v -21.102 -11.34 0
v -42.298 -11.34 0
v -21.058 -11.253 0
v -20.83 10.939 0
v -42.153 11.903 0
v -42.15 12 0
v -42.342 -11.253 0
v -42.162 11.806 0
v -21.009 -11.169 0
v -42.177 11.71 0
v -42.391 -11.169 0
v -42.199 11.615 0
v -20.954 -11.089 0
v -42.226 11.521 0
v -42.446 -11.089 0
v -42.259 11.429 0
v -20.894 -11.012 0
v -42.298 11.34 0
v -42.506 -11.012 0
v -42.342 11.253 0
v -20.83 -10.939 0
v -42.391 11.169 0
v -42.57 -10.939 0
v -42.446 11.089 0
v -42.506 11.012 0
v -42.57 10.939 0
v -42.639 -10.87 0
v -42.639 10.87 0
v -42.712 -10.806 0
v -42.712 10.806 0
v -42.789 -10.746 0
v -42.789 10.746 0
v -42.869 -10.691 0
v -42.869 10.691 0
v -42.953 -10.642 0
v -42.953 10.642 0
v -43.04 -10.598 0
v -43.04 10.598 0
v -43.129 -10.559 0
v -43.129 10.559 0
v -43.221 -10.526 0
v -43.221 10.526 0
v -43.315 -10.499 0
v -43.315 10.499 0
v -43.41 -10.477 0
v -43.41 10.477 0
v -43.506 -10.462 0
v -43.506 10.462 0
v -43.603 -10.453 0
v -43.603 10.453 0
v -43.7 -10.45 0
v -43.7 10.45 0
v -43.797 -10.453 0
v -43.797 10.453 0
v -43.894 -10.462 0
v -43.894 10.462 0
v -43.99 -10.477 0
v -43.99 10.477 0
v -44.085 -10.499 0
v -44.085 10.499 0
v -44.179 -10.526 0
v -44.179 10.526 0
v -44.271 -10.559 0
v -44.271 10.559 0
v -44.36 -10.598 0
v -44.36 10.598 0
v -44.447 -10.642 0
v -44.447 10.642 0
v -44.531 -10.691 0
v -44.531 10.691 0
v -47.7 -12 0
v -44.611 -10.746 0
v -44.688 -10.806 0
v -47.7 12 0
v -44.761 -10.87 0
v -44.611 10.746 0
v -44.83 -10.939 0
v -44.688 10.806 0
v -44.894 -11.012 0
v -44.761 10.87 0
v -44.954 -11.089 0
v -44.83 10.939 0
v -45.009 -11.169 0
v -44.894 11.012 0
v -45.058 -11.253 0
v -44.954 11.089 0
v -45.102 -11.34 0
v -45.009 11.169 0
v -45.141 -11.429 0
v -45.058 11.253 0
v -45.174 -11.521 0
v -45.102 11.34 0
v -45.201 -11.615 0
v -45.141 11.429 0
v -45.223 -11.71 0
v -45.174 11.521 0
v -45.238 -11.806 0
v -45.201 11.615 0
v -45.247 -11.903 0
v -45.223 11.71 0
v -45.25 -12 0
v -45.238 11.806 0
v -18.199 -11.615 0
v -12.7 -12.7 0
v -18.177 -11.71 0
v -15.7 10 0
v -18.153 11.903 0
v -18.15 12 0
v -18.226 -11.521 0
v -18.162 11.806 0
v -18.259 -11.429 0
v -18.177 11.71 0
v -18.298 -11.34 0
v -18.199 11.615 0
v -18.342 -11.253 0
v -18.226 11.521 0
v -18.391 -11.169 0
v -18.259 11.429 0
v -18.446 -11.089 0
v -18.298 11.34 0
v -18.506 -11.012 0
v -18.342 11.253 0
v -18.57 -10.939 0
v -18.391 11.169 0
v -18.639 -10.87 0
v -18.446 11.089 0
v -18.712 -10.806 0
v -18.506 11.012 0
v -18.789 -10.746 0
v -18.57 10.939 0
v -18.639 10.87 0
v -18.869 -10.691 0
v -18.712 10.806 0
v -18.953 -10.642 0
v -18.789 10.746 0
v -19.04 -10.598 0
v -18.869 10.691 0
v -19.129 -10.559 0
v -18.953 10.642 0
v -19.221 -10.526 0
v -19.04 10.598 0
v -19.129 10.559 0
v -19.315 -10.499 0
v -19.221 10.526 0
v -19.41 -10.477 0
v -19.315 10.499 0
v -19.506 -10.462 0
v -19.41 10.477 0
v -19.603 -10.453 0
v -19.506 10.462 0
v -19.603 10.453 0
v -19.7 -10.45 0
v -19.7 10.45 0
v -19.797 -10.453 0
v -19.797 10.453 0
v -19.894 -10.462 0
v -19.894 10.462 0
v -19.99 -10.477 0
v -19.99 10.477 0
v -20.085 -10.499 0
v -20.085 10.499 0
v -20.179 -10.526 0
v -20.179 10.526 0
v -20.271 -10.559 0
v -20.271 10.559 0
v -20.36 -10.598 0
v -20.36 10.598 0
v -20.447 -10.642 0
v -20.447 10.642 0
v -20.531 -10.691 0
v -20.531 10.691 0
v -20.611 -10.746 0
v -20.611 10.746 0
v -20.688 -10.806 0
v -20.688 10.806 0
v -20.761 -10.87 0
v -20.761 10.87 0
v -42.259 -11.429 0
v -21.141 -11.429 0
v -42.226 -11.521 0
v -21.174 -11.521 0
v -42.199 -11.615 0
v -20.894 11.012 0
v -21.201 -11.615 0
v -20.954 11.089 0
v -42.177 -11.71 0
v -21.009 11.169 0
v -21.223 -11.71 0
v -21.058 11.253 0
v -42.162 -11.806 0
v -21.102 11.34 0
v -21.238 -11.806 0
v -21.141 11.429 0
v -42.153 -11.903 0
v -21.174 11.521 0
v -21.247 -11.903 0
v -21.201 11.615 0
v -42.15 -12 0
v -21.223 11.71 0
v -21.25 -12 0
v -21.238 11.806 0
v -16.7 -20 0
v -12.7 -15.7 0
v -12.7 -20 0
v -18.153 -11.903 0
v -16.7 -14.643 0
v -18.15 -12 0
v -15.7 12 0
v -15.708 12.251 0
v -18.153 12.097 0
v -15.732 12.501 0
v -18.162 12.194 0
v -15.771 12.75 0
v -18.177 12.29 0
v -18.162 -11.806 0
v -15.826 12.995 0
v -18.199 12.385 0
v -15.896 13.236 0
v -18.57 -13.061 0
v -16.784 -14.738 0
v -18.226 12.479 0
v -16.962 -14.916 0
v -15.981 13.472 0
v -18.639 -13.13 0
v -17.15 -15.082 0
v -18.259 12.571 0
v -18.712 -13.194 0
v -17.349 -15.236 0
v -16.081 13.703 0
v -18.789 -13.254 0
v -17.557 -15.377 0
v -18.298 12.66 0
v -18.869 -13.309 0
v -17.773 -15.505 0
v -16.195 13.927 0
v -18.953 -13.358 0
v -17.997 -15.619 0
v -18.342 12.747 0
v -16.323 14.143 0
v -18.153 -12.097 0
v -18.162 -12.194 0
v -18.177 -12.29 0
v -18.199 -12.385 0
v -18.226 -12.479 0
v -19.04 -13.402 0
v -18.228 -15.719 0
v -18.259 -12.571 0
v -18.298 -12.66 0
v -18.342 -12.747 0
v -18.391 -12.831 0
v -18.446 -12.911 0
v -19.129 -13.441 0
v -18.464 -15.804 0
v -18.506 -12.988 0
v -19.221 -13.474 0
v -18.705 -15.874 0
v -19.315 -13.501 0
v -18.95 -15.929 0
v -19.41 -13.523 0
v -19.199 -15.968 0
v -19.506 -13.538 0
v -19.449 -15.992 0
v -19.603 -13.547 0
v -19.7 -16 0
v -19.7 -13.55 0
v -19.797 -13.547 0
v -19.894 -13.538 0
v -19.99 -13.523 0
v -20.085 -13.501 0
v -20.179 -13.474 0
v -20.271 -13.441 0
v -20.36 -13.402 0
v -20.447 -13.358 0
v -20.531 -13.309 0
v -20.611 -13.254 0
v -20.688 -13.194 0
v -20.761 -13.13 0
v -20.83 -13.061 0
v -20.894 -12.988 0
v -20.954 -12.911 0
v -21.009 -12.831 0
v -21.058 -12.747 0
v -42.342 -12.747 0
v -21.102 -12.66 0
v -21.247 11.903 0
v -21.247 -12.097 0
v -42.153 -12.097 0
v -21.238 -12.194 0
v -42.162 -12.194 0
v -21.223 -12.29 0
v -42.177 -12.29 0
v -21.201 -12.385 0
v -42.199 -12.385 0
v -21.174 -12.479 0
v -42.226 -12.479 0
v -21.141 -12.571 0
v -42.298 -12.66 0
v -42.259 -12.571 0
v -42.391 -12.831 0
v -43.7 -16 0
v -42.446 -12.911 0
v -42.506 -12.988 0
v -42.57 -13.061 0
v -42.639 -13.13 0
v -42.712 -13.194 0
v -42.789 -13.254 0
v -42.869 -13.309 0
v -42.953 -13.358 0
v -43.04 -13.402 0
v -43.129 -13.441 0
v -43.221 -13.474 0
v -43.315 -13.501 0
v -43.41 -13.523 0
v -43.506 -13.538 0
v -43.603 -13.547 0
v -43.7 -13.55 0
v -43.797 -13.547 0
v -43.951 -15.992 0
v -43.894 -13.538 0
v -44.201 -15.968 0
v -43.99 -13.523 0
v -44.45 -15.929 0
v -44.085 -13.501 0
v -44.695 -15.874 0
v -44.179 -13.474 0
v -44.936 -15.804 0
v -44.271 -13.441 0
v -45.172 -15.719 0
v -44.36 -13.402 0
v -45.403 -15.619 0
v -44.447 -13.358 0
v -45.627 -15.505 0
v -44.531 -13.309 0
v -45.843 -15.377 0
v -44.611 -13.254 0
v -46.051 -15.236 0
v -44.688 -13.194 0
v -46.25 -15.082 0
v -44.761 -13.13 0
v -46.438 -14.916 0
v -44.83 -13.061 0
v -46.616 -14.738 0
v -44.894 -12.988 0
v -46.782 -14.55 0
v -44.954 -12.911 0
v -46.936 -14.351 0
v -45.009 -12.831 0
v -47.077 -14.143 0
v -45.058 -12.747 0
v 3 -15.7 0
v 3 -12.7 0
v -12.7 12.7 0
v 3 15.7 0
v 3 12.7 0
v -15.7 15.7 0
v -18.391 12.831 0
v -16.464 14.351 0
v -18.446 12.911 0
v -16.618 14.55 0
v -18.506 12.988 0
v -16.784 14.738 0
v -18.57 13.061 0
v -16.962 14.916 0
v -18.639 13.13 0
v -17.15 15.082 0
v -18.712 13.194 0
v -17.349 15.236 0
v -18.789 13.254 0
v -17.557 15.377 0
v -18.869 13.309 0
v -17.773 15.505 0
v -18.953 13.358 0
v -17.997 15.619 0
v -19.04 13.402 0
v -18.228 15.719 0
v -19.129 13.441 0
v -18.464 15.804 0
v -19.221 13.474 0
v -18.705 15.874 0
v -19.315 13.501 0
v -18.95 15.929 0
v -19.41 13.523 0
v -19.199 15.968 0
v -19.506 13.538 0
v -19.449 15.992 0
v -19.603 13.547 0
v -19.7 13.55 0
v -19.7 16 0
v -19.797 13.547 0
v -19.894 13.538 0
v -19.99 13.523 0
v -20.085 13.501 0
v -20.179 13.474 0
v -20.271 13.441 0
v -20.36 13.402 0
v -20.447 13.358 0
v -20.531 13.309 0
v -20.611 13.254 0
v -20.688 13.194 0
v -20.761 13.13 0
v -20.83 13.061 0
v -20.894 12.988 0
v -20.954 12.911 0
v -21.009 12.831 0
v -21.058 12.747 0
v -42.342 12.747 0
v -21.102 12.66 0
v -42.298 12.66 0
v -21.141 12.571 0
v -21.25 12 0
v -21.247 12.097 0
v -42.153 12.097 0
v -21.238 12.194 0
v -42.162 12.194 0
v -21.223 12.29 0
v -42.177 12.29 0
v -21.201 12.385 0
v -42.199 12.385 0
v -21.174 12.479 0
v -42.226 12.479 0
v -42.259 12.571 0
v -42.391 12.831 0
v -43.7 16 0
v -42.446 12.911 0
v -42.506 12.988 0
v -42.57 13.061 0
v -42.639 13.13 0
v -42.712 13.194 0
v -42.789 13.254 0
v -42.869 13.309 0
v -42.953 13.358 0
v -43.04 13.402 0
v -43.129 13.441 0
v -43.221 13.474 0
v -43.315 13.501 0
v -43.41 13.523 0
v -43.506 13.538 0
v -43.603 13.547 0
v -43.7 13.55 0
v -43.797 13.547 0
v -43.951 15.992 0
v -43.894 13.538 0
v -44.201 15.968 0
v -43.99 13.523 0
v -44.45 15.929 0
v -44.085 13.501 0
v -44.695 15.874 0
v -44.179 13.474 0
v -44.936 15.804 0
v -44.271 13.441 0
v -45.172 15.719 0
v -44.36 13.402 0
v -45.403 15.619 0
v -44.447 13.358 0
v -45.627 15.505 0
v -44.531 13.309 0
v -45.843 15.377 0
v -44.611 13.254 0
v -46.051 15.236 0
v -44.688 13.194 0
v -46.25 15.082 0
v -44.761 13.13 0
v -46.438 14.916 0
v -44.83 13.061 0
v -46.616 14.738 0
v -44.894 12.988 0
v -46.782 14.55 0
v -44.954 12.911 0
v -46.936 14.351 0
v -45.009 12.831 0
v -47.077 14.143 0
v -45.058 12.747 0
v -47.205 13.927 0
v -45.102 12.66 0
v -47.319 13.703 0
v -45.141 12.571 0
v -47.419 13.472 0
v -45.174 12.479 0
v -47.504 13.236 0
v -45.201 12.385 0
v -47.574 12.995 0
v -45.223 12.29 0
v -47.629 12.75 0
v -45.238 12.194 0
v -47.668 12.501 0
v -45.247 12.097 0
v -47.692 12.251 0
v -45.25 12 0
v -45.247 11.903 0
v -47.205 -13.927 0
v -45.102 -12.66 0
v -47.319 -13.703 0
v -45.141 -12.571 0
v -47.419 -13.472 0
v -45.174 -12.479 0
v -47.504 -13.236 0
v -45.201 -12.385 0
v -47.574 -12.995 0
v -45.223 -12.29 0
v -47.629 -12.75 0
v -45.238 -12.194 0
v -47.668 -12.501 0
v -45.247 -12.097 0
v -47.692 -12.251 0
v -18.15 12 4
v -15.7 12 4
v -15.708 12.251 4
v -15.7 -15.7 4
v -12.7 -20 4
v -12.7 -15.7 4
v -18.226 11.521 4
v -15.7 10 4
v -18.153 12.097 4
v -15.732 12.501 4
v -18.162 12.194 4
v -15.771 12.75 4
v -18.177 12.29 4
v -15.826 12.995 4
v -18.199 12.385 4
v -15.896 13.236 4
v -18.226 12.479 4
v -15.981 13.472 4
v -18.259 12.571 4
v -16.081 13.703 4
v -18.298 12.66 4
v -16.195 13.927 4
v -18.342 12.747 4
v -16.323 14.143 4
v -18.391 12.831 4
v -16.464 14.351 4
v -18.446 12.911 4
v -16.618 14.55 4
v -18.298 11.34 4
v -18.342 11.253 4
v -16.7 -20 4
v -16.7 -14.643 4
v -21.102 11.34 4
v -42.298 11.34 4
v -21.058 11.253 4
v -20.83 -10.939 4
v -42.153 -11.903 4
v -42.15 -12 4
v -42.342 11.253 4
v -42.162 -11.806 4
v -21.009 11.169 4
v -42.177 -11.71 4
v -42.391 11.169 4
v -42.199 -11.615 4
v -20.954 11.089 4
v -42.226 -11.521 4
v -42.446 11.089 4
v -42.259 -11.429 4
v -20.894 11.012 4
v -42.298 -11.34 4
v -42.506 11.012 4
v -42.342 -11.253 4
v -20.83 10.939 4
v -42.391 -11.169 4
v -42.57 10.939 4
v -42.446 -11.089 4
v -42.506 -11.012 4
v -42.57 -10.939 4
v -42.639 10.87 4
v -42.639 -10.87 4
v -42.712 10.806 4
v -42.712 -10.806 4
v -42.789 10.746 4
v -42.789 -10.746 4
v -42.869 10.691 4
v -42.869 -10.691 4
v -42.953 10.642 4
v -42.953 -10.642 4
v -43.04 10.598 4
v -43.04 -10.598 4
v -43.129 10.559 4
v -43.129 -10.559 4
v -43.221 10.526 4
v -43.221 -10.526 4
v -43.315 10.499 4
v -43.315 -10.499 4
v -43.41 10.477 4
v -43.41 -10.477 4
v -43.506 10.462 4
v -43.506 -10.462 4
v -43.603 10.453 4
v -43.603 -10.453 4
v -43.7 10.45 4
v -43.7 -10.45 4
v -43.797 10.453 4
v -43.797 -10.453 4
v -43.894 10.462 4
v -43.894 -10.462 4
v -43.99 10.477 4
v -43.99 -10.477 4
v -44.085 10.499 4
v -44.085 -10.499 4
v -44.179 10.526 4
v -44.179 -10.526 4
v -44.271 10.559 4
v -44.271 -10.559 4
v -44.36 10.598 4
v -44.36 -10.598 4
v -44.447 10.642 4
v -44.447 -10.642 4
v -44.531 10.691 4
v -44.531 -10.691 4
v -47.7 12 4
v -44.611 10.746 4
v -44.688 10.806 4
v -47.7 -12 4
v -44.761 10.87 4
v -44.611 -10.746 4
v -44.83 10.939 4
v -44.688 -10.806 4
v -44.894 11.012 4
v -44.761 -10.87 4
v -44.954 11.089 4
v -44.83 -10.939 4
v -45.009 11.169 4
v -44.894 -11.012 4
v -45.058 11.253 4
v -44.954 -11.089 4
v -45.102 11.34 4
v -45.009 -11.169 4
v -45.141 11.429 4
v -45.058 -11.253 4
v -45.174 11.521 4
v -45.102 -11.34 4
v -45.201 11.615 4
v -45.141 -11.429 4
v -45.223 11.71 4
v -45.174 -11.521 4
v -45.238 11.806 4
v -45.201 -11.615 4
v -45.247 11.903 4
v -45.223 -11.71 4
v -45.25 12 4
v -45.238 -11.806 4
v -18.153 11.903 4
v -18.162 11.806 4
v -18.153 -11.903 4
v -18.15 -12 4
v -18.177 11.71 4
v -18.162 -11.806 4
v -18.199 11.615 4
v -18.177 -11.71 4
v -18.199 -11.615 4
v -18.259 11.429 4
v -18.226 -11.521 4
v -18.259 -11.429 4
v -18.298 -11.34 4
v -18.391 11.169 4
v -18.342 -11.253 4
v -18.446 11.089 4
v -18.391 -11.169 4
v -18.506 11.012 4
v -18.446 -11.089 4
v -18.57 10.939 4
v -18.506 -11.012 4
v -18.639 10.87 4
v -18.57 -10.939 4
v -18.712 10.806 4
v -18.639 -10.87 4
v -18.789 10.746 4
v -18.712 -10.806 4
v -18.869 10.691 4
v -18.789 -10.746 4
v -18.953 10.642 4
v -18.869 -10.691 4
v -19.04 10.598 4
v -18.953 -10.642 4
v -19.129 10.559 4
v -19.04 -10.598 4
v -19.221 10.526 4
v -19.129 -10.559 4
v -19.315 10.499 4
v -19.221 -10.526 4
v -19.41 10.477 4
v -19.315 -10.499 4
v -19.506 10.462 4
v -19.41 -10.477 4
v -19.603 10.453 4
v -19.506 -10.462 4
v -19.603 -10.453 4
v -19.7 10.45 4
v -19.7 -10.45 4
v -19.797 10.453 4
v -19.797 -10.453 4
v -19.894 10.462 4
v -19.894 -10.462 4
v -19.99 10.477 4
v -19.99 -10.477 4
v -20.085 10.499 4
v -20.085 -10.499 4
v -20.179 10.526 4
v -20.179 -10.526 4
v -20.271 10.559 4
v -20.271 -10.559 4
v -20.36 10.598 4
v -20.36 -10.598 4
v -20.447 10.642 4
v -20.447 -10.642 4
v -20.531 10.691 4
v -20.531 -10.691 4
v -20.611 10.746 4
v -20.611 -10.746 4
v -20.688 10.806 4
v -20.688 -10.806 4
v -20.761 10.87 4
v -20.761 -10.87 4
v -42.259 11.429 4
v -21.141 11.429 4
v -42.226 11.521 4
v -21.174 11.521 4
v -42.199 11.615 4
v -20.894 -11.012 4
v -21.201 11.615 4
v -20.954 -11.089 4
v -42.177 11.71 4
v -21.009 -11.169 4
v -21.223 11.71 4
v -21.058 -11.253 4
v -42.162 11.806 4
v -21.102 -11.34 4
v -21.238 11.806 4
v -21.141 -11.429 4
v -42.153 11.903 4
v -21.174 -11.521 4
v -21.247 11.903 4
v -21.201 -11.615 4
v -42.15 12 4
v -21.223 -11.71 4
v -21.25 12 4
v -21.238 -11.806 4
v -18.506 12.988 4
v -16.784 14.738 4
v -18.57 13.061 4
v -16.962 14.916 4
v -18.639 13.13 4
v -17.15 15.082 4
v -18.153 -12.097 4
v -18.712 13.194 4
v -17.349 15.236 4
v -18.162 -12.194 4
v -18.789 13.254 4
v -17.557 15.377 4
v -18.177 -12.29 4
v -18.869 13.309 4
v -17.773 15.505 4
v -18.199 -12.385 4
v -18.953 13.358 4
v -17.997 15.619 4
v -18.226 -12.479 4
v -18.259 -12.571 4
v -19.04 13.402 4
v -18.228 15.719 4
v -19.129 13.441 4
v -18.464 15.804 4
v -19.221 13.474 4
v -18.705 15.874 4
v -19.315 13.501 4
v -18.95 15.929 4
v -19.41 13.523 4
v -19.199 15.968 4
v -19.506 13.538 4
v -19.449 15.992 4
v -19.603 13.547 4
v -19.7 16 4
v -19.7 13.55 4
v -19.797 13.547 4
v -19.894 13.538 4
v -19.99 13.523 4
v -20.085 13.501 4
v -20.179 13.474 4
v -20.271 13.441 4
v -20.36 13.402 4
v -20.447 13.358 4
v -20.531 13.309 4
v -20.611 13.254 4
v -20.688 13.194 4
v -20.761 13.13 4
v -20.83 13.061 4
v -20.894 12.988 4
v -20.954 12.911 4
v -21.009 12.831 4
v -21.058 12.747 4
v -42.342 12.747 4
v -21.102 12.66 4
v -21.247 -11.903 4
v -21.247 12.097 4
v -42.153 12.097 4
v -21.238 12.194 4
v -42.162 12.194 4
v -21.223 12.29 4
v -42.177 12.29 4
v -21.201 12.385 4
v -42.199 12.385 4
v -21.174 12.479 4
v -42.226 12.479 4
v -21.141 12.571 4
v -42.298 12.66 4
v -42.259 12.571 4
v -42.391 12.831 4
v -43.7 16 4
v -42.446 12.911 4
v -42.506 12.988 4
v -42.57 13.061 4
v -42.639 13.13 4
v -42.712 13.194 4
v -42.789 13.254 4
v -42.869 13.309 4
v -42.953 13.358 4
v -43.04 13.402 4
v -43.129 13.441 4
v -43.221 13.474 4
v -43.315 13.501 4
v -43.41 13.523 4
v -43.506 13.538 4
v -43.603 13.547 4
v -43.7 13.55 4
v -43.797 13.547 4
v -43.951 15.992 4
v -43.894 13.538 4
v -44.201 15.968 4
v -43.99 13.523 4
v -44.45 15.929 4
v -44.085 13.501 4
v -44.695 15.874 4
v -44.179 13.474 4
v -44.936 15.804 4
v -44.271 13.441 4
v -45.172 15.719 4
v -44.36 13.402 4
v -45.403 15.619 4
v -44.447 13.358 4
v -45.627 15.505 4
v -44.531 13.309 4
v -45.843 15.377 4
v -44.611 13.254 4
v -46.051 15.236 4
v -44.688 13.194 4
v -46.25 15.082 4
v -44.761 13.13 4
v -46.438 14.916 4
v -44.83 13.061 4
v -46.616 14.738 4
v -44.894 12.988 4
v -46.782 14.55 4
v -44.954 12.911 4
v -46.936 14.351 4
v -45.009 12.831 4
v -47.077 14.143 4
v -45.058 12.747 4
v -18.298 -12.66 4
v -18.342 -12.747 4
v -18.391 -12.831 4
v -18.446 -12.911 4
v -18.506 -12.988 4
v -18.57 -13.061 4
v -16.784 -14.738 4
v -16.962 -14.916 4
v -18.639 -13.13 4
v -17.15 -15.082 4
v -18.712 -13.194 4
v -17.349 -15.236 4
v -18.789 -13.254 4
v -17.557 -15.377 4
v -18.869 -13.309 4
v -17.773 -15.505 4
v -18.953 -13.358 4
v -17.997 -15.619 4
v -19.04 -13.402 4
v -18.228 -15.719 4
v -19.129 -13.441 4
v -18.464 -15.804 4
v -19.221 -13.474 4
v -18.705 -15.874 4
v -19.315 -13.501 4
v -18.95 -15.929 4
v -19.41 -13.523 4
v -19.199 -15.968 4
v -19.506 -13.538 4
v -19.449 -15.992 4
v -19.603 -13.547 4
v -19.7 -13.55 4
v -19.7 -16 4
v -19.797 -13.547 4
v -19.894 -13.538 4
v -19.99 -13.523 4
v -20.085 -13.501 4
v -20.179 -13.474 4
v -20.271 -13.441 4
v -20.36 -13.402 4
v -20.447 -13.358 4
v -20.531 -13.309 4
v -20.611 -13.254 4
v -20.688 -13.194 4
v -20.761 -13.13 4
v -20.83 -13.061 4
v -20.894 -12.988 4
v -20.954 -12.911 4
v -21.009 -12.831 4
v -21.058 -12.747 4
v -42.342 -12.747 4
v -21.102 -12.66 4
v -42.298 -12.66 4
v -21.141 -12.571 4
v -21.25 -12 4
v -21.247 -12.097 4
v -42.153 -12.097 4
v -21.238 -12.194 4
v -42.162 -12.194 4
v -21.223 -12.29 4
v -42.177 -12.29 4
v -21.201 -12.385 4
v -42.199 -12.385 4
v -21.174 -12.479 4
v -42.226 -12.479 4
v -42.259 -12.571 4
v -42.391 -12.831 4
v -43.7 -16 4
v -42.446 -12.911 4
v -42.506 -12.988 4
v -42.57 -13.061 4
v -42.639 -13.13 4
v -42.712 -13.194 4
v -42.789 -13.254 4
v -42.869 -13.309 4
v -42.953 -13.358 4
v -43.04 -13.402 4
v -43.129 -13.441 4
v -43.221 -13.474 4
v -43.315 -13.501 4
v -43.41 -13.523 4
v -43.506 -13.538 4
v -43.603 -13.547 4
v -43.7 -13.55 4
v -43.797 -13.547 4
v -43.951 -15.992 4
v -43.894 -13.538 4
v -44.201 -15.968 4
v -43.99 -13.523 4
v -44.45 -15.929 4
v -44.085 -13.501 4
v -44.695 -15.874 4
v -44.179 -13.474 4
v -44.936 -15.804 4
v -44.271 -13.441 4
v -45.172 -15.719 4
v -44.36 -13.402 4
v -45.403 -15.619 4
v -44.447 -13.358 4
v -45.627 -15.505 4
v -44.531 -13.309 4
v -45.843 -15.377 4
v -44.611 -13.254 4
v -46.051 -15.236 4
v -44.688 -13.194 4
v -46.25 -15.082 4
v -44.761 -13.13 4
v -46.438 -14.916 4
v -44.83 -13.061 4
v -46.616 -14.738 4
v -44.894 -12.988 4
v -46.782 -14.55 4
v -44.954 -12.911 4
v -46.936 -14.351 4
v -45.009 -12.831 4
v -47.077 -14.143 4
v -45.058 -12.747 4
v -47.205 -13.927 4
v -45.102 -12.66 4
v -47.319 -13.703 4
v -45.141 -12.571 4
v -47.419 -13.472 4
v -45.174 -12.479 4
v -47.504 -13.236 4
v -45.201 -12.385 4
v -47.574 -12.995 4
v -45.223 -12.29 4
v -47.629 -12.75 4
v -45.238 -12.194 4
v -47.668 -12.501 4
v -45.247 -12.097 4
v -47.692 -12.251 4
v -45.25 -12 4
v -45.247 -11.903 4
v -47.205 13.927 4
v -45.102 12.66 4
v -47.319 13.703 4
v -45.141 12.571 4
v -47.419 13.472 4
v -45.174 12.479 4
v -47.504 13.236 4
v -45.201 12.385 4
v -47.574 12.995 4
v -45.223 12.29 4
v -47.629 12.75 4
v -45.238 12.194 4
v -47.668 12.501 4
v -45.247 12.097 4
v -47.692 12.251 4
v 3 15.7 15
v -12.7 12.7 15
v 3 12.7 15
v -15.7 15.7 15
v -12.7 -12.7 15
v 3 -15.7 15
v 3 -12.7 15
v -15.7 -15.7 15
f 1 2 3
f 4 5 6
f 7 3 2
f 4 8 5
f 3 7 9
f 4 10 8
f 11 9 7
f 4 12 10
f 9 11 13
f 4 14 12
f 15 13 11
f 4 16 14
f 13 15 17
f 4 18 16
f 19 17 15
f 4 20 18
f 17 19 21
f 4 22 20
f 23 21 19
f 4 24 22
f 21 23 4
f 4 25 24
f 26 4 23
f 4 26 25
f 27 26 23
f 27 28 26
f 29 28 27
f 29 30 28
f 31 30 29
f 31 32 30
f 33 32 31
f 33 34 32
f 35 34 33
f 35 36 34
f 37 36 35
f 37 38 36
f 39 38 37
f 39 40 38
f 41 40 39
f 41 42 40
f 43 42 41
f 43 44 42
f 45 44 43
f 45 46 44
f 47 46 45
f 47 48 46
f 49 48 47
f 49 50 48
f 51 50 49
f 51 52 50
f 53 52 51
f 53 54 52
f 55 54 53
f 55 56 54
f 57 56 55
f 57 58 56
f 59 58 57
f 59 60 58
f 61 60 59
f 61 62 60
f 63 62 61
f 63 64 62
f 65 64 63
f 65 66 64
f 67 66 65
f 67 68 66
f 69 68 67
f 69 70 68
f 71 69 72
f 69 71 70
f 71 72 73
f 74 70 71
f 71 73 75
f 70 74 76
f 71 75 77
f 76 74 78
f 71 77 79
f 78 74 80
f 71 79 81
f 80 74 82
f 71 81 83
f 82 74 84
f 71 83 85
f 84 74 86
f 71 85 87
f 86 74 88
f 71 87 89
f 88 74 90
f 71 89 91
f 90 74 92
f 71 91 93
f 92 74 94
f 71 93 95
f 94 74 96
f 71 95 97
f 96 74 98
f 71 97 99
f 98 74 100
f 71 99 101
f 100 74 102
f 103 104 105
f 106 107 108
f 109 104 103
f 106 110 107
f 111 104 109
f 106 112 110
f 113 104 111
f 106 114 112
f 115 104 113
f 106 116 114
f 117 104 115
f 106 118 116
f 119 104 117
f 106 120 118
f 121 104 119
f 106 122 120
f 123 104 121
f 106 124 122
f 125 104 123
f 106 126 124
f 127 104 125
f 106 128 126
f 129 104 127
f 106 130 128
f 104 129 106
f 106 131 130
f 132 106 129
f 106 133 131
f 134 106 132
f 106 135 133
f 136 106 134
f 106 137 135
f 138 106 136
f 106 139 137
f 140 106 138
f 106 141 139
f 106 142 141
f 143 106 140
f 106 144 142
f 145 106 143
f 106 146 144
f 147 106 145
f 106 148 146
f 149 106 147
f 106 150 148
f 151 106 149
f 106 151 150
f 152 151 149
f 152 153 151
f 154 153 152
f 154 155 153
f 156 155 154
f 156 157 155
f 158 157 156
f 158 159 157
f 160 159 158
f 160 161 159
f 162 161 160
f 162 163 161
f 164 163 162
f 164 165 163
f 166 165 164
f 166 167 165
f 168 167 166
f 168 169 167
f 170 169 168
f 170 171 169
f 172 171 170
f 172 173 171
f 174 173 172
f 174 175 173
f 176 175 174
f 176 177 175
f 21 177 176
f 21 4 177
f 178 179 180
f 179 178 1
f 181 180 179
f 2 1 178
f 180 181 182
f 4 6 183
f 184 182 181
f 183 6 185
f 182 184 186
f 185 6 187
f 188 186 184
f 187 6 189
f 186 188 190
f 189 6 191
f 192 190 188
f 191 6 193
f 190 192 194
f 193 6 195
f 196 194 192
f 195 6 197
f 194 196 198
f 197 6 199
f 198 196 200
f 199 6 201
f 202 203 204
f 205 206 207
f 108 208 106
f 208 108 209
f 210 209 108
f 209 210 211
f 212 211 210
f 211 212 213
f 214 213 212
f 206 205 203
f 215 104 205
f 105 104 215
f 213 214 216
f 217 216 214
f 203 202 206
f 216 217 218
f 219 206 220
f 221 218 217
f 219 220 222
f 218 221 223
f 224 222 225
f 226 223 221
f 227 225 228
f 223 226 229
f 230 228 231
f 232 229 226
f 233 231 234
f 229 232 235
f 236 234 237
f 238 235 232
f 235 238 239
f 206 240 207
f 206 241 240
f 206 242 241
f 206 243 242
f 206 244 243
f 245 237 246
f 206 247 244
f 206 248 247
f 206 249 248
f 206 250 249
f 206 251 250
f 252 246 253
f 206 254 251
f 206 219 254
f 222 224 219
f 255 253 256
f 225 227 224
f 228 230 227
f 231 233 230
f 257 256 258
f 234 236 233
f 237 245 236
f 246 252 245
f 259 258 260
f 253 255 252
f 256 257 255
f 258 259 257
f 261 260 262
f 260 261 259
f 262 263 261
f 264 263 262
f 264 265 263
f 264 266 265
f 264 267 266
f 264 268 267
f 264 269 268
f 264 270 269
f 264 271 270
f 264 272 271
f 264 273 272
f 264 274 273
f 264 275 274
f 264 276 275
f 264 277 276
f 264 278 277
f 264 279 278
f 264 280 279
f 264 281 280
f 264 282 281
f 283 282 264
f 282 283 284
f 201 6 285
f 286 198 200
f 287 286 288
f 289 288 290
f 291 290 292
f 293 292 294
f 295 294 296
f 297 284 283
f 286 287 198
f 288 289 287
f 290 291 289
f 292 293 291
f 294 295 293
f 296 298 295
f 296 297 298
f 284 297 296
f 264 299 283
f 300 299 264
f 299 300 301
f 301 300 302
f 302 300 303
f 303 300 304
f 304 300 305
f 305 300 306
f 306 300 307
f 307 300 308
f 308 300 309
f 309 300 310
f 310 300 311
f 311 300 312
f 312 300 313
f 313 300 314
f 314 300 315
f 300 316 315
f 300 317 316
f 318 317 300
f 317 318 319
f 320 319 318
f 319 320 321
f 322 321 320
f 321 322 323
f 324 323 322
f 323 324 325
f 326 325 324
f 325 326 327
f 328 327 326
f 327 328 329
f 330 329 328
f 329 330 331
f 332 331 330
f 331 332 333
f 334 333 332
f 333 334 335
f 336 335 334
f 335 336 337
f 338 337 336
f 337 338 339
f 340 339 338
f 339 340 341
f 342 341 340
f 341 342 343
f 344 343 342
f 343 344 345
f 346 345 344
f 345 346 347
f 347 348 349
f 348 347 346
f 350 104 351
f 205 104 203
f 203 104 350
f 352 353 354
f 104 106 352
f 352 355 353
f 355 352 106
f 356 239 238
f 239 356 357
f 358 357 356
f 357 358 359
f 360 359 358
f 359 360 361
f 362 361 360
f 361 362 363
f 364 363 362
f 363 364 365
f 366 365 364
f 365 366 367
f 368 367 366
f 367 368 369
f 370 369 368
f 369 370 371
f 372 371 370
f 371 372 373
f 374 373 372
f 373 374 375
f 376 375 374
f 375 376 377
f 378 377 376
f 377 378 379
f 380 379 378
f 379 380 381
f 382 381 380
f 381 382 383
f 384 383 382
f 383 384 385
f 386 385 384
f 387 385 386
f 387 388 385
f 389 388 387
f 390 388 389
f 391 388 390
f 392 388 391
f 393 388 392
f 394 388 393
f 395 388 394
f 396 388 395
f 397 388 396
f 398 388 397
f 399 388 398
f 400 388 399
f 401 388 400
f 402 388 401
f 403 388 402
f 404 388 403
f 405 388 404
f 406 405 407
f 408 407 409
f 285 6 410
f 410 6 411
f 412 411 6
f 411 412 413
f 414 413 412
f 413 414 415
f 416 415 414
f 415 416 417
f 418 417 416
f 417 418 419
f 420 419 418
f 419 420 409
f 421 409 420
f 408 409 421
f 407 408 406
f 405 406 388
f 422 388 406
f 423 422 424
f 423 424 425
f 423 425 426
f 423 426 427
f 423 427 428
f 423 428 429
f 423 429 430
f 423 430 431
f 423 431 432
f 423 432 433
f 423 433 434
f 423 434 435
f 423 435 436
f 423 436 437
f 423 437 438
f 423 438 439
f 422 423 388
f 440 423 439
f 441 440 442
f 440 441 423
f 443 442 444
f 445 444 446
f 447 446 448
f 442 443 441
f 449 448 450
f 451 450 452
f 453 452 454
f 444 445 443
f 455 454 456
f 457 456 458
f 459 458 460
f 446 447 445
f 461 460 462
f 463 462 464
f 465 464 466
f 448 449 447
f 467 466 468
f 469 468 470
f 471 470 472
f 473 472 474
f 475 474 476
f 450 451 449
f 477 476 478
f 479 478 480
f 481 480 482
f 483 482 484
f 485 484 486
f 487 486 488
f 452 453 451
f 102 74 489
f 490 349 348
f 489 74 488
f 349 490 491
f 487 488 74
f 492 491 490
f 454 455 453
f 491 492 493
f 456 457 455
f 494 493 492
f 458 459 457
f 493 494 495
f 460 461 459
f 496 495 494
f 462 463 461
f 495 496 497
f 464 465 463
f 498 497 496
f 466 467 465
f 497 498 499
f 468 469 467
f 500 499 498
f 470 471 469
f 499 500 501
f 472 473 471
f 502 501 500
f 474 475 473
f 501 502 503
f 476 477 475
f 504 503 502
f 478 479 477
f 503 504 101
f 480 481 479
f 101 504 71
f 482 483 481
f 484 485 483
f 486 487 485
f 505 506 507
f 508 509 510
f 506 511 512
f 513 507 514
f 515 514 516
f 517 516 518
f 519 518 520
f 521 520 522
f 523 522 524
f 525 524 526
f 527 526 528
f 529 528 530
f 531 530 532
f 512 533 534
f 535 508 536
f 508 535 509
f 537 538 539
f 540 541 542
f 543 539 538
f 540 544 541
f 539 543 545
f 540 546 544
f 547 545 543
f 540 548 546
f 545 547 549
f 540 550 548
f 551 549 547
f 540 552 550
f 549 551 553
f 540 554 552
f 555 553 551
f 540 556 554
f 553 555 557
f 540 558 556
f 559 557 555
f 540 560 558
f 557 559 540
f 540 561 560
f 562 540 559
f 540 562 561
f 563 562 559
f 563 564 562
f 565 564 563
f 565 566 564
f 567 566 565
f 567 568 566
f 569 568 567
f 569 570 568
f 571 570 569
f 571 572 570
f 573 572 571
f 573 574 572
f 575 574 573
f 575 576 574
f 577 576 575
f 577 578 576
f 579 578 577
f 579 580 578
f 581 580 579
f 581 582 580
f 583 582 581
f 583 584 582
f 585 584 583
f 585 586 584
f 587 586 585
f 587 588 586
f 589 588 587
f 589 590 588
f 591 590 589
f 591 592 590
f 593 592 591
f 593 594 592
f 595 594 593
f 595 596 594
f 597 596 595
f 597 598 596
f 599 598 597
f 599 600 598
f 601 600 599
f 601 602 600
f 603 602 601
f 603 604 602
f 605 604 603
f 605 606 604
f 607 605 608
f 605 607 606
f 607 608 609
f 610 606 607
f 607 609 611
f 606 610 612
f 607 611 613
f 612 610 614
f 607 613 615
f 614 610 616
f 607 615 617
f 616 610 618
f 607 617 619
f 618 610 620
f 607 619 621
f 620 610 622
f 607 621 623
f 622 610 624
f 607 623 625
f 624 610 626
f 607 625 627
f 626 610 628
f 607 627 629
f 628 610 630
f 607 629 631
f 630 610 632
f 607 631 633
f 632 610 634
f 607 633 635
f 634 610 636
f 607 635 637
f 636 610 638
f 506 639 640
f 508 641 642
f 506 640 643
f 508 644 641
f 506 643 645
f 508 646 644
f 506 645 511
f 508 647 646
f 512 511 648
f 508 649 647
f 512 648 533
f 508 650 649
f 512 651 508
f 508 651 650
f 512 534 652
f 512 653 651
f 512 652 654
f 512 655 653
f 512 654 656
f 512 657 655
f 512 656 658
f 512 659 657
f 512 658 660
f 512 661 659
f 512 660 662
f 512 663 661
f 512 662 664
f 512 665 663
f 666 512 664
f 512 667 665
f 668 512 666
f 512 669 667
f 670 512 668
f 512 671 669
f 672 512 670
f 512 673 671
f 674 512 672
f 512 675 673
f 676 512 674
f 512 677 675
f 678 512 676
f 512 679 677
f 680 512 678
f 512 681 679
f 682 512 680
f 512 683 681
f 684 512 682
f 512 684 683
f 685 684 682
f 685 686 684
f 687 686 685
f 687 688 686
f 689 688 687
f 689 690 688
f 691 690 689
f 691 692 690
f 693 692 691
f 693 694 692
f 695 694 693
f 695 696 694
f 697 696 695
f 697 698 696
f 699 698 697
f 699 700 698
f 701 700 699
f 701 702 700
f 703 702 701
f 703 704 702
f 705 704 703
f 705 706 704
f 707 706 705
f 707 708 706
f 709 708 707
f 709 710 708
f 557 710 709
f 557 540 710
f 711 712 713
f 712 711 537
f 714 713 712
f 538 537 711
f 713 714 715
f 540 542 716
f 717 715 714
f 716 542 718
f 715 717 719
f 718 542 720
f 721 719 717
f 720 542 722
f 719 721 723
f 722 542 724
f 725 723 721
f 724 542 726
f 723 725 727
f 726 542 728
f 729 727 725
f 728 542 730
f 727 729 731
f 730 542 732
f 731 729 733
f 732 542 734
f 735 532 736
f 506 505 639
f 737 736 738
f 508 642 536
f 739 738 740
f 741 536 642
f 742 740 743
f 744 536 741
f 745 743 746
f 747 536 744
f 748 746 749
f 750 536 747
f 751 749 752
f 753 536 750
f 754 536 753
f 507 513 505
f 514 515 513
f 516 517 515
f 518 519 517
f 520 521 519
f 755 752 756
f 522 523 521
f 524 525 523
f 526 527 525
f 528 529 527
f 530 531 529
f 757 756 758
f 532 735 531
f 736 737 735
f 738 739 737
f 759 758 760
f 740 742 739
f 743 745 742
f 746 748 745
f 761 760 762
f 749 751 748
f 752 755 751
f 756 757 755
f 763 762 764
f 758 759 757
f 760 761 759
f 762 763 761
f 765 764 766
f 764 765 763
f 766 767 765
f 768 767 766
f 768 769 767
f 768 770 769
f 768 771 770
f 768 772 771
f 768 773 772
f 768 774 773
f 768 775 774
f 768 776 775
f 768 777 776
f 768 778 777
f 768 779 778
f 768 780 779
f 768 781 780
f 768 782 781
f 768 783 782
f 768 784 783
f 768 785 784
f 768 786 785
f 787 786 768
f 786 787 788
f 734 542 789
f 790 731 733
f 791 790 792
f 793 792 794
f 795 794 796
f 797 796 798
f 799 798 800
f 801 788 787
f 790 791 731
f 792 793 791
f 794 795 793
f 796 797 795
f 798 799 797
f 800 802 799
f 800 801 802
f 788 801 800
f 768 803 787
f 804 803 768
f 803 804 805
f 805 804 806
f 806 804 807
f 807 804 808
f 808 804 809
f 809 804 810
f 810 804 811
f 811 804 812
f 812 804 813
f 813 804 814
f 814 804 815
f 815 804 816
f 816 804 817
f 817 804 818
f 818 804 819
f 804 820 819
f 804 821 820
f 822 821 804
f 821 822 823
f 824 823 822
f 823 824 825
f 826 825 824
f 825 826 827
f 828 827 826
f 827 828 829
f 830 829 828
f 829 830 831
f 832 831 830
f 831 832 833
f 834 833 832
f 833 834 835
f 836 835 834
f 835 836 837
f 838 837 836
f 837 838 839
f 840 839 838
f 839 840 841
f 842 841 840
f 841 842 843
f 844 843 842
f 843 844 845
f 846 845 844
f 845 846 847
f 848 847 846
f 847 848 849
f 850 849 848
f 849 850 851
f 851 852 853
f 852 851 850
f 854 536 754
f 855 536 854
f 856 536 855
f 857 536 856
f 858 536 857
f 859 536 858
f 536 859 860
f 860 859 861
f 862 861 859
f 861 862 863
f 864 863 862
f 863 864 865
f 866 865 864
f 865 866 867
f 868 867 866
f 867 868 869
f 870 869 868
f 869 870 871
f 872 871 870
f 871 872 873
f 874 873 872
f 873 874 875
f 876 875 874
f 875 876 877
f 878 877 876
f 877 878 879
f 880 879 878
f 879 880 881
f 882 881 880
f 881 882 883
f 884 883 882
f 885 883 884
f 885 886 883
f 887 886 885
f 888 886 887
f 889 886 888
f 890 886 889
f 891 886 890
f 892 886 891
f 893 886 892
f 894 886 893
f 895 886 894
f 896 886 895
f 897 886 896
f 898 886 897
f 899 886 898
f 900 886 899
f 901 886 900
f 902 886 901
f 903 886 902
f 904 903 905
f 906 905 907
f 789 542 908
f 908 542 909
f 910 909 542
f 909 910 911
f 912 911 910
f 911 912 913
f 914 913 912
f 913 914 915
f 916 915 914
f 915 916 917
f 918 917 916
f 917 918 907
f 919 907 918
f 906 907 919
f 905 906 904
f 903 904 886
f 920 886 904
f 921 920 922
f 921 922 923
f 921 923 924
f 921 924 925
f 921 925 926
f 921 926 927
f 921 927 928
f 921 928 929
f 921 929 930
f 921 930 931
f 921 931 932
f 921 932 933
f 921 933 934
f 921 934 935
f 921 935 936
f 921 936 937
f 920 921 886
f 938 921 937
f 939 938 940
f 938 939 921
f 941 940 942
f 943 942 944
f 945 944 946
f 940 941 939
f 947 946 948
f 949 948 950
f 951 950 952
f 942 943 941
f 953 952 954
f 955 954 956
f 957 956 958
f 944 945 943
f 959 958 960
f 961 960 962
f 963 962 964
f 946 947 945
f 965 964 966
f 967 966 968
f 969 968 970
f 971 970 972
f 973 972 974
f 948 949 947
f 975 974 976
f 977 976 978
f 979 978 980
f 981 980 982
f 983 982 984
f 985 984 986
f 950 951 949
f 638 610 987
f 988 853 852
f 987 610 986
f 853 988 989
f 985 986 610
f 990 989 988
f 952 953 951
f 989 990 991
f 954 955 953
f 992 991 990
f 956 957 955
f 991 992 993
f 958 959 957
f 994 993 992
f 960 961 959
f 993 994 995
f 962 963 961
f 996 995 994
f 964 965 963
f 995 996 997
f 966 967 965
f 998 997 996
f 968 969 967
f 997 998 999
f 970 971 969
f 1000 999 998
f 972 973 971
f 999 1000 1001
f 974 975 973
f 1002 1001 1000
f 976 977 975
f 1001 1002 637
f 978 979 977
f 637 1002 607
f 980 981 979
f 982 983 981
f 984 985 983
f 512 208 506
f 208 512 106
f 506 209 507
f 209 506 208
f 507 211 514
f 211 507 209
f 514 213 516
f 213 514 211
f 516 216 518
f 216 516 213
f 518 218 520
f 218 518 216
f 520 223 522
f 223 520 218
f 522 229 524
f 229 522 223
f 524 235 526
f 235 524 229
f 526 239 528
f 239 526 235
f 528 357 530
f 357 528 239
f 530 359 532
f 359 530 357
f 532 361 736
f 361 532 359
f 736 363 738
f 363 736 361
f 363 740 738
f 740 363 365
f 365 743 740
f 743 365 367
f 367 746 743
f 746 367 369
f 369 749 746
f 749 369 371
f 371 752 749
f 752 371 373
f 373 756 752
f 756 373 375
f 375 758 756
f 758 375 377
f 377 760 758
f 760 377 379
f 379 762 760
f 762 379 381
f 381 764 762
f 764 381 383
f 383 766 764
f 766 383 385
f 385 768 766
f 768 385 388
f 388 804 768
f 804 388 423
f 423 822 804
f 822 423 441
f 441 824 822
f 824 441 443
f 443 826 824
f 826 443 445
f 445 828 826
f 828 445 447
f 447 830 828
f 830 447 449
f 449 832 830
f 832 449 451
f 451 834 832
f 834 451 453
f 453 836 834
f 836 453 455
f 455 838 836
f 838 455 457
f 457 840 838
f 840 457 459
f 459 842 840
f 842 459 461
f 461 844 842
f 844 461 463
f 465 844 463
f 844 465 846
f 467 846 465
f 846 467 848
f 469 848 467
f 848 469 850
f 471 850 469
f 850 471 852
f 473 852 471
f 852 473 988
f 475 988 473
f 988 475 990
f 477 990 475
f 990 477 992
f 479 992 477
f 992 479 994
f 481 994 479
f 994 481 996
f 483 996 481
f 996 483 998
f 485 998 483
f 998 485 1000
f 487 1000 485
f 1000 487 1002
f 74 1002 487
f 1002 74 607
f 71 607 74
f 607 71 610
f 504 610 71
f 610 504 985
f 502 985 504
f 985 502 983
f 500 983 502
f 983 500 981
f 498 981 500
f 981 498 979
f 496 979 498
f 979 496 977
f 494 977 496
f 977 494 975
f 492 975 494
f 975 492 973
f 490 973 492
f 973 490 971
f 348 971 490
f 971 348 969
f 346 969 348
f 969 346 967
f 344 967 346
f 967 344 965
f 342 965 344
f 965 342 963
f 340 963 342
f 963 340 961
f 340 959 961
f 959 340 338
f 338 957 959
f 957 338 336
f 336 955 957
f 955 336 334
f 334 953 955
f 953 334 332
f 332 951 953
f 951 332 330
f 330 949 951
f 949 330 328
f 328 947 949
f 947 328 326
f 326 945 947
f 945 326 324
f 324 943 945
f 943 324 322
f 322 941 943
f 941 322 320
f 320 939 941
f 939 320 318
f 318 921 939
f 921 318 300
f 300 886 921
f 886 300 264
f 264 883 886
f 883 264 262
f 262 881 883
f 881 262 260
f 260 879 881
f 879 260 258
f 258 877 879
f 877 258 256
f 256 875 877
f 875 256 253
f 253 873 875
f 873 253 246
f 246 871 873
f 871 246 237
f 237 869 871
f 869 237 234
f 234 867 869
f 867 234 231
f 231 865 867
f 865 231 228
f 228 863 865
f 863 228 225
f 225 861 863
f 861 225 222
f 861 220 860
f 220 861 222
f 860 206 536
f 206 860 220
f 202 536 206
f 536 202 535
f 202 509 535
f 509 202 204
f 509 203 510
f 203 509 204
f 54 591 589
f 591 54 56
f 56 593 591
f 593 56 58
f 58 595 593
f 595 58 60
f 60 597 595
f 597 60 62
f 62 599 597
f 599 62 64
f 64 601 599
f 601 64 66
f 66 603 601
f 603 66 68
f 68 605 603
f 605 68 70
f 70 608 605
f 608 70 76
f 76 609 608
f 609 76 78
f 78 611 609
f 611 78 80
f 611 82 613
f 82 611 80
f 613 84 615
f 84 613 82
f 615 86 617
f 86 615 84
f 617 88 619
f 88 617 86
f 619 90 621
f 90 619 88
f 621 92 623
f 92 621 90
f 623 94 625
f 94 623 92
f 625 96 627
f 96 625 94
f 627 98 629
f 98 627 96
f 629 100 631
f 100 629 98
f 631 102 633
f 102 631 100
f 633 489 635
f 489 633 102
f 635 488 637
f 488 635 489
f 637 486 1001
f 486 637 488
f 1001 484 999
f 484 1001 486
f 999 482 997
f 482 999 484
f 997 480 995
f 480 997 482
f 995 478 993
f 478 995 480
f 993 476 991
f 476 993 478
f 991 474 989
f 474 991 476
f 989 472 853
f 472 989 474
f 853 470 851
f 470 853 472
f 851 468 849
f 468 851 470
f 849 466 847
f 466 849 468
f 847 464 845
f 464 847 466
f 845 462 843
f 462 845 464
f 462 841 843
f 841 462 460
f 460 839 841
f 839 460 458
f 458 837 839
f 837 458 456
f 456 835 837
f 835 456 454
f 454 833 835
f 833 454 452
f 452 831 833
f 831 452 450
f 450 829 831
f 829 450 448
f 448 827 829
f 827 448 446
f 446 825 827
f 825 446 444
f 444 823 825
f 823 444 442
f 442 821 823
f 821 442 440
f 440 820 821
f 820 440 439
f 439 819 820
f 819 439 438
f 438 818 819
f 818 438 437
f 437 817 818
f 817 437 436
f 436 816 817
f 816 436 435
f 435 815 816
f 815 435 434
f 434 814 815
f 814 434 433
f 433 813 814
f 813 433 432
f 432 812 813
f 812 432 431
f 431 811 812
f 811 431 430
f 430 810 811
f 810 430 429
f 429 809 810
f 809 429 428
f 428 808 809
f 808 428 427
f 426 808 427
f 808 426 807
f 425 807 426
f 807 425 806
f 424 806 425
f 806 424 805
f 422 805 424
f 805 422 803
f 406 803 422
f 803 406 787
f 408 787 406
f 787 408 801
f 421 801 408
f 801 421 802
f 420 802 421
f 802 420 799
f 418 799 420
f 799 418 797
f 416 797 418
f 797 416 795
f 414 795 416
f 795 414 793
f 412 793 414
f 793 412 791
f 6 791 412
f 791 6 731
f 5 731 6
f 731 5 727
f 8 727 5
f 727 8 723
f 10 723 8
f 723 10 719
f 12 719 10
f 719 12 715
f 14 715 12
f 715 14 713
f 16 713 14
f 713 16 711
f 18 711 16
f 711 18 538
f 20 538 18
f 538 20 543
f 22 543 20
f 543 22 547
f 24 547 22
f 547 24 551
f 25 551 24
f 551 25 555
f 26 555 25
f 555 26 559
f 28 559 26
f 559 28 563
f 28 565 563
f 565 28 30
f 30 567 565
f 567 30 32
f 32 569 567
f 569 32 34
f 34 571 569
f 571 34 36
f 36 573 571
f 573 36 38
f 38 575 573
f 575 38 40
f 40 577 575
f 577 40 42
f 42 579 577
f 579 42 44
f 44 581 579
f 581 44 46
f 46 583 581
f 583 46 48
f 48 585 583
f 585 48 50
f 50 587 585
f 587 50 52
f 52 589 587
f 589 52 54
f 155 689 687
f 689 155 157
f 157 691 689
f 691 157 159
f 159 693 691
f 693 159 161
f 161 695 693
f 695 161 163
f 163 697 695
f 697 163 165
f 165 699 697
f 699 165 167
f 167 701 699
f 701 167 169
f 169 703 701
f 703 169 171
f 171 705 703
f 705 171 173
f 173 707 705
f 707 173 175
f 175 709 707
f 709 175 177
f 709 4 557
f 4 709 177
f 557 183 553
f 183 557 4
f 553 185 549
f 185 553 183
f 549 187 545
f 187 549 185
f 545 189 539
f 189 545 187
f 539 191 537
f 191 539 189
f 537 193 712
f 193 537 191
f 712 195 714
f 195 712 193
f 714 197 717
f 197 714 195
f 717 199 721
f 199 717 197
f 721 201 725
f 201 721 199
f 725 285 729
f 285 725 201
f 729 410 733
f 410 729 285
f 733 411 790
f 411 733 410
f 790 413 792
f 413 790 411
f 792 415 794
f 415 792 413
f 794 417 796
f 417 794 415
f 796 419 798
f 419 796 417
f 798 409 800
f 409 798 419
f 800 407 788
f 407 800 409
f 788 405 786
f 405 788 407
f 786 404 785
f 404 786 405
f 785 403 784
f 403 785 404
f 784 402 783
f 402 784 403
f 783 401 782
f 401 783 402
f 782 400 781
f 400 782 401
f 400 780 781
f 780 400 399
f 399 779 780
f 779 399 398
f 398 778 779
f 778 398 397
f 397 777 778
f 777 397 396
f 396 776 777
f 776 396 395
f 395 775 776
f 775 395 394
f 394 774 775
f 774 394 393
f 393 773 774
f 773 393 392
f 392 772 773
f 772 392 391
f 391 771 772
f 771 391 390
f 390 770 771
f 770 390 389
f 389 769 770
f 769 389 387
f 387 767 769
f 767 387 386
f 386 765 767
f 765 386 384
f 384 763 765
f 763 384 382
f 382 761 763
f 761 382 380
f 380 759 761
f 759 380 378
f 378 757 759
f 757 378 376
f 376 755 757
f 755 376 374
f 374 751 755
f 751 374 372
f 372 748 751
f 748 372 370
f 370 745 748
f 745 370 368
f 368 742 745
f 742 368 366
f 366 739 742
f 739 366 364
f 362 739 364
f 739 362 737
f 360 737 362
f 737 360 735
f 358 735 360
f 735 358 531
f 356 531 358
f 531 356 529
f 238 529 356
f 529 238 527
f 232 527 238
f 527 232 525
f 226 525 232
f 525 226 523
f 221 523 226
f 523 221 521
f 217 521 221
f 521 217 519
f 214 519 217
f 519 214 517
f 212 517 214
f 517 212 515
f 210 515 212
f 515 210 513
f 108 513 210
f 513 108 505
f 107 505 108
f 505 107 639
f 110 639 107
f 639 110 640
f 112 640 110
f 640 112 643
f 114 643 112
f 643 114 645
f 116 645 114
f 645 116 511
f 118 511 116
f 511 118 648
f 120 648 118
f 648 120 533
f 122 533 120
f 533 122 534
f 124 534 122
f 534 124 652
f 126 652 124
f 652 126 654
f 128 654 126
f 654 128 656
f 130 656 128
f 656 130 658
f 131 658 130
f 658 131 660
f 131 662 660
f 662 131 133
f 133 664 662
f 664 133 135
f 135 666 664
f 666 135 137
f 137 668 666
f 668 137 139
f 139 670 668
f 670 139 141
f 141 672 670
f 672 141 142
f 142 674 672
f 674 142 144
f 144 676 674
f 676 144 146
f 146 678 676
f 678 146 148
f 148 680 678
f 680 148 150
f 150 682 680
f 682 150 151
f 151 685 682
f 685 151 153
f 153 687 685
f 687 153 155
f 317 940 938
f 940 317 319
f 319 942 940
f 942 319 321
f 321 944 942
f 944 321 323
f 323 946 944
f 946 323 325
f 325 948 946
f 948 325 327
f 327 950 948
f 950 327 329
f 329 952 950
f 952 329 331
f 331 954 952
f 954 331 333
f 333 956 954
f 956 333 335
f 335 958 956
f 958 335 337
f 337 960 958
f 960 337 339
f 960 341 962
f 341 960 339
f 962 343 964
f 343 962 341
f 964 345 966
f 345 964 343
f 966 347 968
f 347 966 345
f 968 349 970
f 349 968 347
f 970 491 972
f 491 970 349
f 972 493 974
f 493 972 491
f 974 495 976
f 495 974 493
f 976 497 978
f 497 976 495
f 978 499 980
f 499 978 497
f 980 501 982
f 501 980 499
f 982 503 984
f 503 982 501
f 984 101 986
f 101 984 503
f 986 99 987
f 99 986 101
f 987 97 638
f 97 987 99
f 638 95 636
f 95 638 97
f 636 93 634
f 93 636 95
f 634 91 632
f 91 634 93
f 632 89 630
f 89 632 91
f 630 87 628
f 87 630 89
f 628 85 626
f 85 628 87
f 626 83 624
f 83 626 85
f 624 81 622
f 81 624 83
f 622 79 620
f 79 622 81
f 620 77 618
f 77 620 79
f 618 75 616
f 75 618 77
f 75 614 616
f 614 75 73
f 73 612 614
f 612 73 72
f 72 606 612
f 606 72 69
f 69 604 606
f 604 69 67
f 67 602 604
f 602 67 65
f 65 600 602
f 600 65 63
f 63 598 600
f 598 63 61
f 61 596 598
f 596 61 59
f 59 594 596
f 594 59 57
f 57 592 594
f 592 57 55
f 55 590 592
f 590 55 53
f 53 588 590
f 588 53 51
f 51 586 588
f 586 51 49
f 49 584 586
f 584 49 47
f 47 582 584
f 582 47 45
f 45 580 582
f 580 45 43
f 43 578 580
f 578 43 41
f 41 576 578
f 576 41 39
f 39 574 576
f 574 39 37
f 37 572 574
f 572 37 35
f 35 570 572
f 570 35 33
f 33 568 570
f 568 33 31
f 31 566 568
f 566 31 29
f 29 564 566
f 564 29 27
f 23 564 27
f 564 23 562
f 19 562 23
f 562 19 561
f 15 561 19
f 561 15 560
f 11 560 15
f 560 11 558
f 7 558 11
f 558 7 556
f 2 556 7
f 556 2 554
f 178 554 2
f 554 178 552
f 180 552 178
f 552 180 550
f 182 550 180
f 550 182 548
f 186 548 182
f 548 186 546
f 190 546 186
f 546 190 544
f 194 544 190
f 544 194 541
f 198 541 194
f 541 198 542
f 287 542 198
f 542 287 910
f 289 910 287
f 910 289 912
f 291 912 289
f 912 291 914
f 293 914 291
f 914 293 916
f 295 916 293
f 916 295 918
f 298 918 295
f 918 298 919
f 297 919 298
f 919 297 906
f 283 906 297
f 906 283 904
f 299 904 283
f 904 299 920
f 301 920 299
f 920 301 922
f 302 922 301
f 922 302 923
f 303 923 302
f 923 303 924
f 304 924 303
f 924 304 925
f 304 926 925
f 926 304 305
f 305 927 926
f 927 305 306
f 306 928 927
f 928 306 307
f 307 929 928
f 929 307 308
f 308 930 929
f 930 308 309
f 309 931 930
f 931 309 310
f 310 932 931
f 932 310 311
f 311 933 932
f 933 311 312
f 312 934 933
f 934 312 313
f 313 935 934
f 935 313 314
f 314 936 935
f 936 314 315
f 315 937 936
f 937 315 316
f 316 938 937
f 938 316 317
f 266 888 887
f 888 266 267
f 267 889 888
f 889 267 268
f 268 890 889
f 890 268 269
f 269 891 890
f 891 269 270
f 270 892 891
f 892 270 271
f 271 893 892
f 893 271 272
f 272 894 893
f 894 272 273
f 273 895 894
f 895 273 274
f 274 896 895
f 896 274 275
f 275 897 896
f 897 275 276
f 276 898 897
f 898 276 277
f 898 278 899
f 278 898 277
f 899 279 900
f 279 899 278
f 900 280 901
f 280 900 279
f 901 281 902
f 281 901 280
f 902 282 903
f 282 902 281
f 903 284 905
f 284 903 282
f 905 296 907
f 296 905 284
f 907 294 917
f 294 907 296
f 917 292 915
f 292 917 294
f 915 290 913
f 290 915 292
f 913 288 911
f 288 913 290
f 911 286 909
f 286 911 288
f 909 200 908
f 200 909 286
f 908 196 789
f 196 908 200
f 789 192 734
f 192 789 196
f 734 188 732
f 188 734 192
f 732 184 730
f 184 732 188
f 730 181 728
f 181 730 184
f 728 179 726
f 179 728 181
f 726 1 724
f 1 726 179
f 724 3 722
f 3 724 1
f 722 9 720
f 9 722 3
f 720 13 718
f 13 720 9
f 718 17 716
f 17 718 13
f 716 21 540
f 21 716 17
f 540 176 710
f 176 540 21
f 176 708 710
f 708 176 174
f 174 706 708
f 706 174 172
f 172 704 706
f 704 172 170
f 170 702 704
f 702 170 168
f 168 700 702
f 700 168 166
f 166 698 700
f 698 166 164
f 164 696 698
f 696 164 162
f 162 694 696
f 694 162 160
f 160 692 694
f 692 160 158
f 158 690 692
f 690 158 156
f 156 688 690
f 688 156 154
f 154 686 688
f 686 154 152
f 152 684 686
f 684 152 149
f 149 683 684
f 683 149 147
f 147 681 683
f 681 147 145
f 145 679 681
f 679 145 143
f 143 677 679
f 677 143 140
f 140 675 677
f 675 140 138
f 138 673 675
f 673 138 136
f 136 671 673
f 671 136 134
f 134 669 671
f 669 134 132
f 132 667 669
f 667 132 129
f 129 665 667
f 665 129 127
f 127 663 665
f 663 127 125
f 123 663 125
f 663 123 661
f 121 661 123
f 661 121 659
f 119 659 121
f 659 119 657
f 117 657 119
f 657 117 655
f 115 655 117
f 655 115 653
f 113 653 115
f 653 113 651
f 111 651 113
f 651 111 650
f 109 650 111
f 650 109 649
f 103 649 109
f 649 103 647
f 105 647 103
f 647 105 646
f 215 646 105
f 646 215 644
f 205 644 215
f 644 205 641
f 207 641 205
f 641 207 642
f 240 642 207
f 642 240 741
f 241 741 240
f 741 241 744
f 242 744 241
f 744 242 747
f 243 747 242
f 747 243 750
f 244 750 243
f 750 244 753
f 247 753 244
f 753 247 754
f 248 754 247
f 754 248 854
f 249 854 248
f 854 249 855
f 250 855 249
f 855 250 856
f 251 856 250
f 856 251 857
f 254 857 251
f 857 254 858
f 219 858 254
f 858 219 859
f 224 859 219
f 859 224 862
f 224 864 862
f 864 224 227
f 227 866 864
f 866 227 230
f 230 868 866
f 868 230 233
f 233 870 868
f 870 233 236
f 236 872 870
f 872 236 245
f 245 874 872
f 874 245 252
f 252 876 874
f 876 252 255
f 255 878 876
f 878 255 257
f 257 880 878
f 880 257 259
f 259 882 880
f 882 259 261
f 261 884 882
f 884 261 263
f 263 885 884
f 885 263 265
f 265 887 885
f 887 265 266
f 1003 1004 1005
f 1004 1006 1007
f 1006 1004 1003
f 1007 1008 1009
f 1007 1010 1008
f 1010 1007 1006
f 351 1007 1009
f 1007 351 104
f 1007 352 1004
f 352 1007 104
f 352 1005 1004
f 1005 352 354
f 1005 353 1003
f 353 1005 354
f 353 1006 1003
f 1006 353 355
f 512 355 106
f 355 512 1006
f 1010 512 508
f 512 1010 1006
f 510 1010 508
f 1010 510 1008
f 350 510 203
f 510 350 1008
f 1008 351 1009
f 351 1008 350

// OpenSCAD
// file: ../scad_libs/variables.scad
function _(a,k) = [
    for(i=[0:2:len(a)-2]) if(a[i]==k) a[i+1]
][0];


function c(k) = _(c,k);
c = [
    "t", 2,     //thickness
    "ts", 3.5,  //thickness structural
    "tmin", 1,  //minimum thickness
    "g", 0.065,  //gap
    "gs", 0.07  //gap smooth
];

function screw(k) = _(screw,k);
screw = [
    "d", 3,     //diameter
    "l", 12,    //long length
    "s", 7      //short length
];
    

function tslot(k) = _(tslot, k);
tslot = [
    "o", 12.7   //offset
];
// file: ../scad_libs/parts.scad
$fn = 100;

use <utils.scad>
use <variables.scad>

module tslot(l) {
    linear_extrude(height=r) {
        
    }
}


module sensormount(hole = 4.33)  {
    translate([-12,-12,0])
    difference() {
        round_2d(4) square(24);
        
        for (x = [0,24]) for (y = [0,24]) translate([x,y,0]) circle(hole/2);
    }
}

module tslot() { translate([-tslot("o"),0,0]) import("resources/tslot.dxf"); }
module tslothook(thickness = 2) {
    t = 2;
    
    nubwidth = 5.7;
    nubheight = 6;
    
    
    xadd = 2.85;
    yadd = 2.95;
    
    difference() {
        translate([-tslot("o")-t,-yadd,0]) square([tslot("o")+t+xadd,tslot("o")+t+yadd]);
        translate([-tslot("o"),-yadd,0]) square([tslot("o")+xadd, tslot("o")+yadd]);
    }
    difference() {
        union() {
            tslot();
            
            translate([0,tslot("o"),0]) resize([nubwidth,nubheight]) circle();
        }
        
        translate([nubwidth/-2,tslot("o"),0]) square([nubwidth, nubheight]);
        
        translate([-tslot("o"),-0.2,0]) 
        difference() {
            translate([0,-1,0]) square([9.8,15]);
            translate([0,-1.6,0]) scale([1,0.6,1]) circle(7.75);
        }
    }
    
}

linear_extrude(height = 4)
tslothook();
// file: ../scad_libs/utils.scad
$fn = 100;

module round(r) { minkowski() {
    sphere(r);
    children();
} }
module round_2d(r) { minkowski() {
    circle(r);
    children();
} }
// main file
use <../scad_libs/utils.scad>
use <../scad_libs/parts.scad>
use <../scad_libs/variables.scad>



legs = [true, true, true, true];
legheight = 15;

t = 3;
xadd = 3;

linear_extrude(height = 4) translate([-28.7 - t,0,0]) {
    sensormount(hole = 3.1);
    y = 30;
    translate([15,-20,0]) square([4,y]);
}
linear_extrude(height = 15) {
    tslot();
    rotate([0,0,90]) tslot();
    rotate([0,0,-90]) tslot();
    
    difference() {
        translate([-tslot("o")-t,-tslot("o")-t,0]) square([tslot("o")+t+xadd, 2*(tslot("o") + t)]);
        translate([-tslot("o"),-tslot("o"),0]) square([tslot("o")+xadd, 2*tslot("o")]);
    }
    
}



/*rotate([180,0,0]) linear_extrude(height = legheight) {
    for(i = [0:3]) if(legs[i]) rotate([0,0,i * 90]) tslot();
}*/
